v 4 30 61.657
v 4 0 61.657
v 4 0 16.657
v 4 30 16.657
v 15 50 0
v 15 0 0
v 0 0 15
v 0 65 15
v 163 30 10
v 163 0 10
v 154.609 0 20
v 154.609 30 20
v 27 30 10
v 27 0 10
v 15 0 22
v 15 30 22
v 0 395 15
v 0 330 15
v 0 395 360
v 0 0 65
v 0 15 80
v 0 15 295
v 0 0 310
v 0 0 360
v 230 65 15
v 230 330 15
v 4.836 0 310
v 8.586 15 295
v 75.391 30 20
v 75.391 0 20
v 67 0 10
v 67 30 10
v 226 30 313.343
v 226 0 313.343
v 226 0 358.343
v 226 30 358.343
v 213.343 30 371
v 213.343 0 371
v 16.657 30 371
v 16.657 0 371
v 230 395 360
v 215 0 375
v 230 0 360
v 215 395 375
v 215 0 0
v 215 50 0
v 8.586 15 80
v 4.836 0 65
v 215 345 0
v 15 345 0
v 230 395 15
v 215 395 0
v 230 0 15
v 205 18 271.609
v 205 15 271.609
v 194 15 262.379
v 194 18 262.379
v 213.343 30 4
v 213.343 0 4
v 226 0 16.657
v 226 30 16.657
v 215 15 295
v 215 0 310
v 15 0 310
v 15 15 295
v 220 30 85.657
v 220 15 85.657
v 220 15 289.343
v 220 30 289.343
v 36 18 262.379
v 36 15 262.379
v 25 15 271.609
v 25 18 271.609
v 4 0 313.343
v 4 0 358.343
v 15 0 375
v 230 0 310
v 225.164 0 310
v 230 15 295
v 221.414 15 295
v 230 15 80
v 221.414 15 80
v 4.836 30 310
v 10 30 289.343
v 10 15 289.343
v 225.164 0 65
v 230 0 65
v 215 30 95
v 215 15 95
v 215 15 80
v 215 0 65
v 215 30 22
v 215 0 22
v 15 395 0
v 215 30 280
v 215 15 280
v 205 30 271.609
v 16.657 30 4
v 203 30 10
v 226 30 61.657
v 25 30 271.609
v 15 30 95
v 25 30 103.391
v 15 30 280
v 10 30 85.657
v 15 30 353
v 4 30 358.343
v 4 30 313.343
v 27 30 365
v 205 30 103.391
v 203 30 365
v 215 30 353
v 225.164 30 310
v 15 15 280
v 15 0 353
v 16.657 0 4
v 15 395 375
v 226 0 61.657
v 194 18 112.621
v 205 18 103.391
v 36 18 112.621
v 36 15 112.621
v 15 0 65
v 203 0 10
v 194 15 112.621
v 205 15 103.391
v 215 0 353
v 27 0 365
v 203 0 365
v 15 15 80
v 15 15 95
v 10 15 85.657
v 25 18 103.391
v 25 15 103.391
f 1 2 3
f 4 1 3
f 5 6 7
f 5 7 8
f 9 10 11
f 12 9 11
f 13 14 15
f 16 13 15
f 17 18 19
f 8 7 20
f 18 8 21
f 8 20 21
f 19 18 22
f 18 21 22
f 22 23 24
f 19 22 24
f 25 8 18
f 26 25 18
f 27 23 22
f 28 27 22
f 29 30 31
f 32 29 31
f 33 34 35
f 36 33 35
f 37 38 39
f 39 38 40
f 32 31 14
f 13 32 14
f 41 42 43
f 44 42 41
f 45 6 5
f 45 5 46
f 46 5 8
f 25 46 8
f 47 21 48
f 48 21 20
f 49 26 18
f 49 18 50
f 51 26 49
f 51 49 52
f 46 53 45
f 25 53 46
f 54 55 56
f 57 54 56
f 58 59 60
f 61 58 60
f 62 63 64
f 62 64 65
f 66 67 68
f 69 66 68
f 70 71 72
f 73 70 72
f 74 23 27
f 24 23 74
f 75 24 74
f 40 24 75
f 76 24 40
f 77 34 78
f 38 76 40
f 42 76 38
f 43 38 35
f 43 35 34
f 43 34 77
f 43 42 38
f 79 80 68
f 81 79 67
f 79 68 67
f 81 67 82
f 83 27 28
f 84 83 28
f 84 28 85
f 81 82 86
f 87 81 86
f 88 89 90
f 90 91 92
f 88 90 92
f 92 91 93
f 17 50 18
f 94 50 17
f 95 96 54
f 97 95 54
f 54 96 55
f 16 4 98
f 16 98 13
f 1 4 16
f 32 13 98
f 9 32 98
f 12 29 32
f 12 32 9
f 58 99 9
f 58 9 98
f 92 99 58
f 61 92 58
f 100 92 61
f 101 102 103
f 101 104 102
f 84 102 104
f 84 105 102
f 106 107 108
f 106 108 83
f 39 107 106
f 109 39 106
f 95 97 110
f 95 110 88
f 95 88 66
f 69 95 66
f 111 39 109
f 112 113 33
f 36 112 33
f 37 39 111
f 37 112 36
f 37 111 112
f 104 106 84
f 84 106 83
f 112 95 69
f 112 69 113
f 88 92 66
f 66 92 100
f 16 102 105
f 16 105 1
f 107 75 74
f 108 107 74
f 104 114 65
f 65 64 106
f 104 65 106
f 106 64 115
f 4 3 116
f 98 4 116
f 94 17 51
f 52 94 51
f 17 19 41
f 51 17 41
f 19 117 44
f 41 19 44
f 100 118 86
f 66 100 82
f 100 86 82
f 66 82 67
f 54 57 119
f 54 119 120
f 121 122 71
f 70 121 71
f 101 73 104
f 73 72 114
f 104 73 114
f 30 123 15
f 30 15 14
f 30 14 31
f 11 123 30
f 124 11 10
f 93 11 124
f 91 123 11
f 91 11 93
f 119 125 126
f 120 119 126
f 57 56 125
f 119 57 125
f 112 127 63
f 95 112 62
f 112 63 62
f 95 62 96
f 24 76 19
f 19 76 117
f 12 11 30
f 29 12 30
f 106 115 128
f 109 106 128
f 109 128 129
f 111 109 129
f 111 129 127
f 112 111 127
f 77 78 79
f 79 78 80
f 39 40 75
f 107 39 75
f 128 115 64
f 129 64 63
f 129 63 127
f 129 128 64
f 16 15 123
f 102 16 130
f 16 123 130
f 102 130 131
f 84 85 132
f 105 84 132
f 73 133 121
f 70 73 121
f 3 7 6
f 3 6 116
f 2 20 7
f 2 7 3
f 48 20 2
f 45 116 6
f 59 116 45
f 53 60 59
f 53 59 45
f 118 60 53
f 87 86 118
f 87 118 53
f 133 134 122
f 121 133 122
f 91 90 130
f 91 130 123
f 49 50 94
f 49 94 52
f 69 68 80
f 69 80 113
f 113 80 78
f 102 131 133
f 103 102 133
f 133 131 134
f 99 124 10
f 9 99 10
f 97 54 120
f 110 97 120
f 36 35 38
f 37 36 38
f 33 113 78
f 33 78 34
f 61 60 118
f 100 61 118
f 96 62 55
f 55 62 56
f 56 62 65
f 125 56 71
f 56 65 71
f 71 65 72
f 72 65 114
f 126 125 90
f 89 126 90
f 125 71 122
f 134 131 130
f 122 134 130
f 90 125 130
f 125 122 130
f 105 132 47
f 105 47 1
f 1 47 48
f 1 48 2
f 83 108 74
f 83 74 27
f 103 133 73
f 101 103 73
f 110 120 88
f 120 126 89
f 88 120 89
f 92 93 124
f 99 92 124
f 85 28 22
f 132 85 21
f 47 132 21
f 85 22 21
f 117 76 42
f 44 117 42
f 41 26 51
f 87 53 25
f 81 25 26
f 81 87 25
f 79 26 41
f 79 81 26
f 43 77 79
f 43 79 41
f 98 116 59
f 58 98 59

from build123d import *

# Parameters (mm, degrees)
F0_W     = 230
F0_H     = 375
F1_DEPTH = 395
F2_SIZE  = 15
F4_DEPTH = 230.001
F6_DEPTH = 30
F8_DEPTH = 3


with BuildPart() as f1:
    # F0 (on Front) → F1 (new body)
    with BuildSketch(Plane.XZ):
        with Locations((115, 187.5)):
            Rectangle(F0_W, F0_H)
    extrude(amount=-F1_DEPTH)

    # F2
    f2_edges = [f1.edges().sort_by_distance(p)[0] for p in [
        (0, 197.5, 375),
        (0, 197.5, 0),
        (230, 197.5, 375),
        (230, 197.5, 0),
    ]]
    chamfer(f2_edges, length=F2_SIZE)

    # F3 (on face) → F4 (cut, through all)
    with BuildSketch(Plane(origin=(0, 0, 0), x_dir=(0, -1, 0), z_dir=(-1, 0, 0))):
        Polygon((-50, 0), (-65, 15), (-330, 15), (-345, 0), align=None)
        Polygon((-15, 80), (0, 65), (0, 310), (-15, 295), align=None)
    extrude(amount=-F4_DEPTH, mode=Mode.SUBTRACT)

    # F5 (on face) → F6 (cut)
    with BuildSketch(Plane.XZ):
        Polygon((15, 280), (15, 310), (4.8357864376, 310), (10, 289.3431457505), (10, 85.6568542495), (4, 61.6568542495), (4, 16.6568542495), (16.6568542495, 4), (115, 4), (213.3431457505, 4), (226, 16.6568542495), (226, 61.6568542495), (220, 85.6568542495), (220, 289.3431457505), (225.1642135624, 310), (215, 310), (215, 280), (205, 271.6090036882), (205, 103.3909963118), (215, 95), (215, 22), (203, 10), (163, 10), (154.6090036882, 20), (115, 20), (75.3909963118, 20), (67, 10), (27, 10), (15, 22), (15, 95), (25, 103.3909963118), (25, 271.6090036882), align=None)
        Polygon((15, 310), (15, 353), (27, 365), (115, 365), (203, 365), (215, 353), (215, 310), (225.1642135624, 310), (226, 313.3431457505), (226, 358.3431457505), (213.3431457505, 371), (115, 371), (16.6568542495, 371), (4, 358.3431457505), (4, 313.3431457505), (4.8357864376, 310), align=None)
    extrude(amount=-F6_DEPTH, mode=Mode.SUBTRACT)

    # F7 (on face) → F8 (cut)
    with BuildSketch(Plane.XZ.offset(-15)):
        Polygon((36, 262.3789077453), (25, 271.6090036882), (25, 103.3909963118), (36, 112.6210922547), align=None)
        Polygon((205, 103.3909963118), (205, 271.6090036882), (194, 262.3789077453), (194, 112.6210922547), align=None)
    extrude(amount=-F8_DEPTH, mode=Mode.SUBTRACT)


solid = f1.part
